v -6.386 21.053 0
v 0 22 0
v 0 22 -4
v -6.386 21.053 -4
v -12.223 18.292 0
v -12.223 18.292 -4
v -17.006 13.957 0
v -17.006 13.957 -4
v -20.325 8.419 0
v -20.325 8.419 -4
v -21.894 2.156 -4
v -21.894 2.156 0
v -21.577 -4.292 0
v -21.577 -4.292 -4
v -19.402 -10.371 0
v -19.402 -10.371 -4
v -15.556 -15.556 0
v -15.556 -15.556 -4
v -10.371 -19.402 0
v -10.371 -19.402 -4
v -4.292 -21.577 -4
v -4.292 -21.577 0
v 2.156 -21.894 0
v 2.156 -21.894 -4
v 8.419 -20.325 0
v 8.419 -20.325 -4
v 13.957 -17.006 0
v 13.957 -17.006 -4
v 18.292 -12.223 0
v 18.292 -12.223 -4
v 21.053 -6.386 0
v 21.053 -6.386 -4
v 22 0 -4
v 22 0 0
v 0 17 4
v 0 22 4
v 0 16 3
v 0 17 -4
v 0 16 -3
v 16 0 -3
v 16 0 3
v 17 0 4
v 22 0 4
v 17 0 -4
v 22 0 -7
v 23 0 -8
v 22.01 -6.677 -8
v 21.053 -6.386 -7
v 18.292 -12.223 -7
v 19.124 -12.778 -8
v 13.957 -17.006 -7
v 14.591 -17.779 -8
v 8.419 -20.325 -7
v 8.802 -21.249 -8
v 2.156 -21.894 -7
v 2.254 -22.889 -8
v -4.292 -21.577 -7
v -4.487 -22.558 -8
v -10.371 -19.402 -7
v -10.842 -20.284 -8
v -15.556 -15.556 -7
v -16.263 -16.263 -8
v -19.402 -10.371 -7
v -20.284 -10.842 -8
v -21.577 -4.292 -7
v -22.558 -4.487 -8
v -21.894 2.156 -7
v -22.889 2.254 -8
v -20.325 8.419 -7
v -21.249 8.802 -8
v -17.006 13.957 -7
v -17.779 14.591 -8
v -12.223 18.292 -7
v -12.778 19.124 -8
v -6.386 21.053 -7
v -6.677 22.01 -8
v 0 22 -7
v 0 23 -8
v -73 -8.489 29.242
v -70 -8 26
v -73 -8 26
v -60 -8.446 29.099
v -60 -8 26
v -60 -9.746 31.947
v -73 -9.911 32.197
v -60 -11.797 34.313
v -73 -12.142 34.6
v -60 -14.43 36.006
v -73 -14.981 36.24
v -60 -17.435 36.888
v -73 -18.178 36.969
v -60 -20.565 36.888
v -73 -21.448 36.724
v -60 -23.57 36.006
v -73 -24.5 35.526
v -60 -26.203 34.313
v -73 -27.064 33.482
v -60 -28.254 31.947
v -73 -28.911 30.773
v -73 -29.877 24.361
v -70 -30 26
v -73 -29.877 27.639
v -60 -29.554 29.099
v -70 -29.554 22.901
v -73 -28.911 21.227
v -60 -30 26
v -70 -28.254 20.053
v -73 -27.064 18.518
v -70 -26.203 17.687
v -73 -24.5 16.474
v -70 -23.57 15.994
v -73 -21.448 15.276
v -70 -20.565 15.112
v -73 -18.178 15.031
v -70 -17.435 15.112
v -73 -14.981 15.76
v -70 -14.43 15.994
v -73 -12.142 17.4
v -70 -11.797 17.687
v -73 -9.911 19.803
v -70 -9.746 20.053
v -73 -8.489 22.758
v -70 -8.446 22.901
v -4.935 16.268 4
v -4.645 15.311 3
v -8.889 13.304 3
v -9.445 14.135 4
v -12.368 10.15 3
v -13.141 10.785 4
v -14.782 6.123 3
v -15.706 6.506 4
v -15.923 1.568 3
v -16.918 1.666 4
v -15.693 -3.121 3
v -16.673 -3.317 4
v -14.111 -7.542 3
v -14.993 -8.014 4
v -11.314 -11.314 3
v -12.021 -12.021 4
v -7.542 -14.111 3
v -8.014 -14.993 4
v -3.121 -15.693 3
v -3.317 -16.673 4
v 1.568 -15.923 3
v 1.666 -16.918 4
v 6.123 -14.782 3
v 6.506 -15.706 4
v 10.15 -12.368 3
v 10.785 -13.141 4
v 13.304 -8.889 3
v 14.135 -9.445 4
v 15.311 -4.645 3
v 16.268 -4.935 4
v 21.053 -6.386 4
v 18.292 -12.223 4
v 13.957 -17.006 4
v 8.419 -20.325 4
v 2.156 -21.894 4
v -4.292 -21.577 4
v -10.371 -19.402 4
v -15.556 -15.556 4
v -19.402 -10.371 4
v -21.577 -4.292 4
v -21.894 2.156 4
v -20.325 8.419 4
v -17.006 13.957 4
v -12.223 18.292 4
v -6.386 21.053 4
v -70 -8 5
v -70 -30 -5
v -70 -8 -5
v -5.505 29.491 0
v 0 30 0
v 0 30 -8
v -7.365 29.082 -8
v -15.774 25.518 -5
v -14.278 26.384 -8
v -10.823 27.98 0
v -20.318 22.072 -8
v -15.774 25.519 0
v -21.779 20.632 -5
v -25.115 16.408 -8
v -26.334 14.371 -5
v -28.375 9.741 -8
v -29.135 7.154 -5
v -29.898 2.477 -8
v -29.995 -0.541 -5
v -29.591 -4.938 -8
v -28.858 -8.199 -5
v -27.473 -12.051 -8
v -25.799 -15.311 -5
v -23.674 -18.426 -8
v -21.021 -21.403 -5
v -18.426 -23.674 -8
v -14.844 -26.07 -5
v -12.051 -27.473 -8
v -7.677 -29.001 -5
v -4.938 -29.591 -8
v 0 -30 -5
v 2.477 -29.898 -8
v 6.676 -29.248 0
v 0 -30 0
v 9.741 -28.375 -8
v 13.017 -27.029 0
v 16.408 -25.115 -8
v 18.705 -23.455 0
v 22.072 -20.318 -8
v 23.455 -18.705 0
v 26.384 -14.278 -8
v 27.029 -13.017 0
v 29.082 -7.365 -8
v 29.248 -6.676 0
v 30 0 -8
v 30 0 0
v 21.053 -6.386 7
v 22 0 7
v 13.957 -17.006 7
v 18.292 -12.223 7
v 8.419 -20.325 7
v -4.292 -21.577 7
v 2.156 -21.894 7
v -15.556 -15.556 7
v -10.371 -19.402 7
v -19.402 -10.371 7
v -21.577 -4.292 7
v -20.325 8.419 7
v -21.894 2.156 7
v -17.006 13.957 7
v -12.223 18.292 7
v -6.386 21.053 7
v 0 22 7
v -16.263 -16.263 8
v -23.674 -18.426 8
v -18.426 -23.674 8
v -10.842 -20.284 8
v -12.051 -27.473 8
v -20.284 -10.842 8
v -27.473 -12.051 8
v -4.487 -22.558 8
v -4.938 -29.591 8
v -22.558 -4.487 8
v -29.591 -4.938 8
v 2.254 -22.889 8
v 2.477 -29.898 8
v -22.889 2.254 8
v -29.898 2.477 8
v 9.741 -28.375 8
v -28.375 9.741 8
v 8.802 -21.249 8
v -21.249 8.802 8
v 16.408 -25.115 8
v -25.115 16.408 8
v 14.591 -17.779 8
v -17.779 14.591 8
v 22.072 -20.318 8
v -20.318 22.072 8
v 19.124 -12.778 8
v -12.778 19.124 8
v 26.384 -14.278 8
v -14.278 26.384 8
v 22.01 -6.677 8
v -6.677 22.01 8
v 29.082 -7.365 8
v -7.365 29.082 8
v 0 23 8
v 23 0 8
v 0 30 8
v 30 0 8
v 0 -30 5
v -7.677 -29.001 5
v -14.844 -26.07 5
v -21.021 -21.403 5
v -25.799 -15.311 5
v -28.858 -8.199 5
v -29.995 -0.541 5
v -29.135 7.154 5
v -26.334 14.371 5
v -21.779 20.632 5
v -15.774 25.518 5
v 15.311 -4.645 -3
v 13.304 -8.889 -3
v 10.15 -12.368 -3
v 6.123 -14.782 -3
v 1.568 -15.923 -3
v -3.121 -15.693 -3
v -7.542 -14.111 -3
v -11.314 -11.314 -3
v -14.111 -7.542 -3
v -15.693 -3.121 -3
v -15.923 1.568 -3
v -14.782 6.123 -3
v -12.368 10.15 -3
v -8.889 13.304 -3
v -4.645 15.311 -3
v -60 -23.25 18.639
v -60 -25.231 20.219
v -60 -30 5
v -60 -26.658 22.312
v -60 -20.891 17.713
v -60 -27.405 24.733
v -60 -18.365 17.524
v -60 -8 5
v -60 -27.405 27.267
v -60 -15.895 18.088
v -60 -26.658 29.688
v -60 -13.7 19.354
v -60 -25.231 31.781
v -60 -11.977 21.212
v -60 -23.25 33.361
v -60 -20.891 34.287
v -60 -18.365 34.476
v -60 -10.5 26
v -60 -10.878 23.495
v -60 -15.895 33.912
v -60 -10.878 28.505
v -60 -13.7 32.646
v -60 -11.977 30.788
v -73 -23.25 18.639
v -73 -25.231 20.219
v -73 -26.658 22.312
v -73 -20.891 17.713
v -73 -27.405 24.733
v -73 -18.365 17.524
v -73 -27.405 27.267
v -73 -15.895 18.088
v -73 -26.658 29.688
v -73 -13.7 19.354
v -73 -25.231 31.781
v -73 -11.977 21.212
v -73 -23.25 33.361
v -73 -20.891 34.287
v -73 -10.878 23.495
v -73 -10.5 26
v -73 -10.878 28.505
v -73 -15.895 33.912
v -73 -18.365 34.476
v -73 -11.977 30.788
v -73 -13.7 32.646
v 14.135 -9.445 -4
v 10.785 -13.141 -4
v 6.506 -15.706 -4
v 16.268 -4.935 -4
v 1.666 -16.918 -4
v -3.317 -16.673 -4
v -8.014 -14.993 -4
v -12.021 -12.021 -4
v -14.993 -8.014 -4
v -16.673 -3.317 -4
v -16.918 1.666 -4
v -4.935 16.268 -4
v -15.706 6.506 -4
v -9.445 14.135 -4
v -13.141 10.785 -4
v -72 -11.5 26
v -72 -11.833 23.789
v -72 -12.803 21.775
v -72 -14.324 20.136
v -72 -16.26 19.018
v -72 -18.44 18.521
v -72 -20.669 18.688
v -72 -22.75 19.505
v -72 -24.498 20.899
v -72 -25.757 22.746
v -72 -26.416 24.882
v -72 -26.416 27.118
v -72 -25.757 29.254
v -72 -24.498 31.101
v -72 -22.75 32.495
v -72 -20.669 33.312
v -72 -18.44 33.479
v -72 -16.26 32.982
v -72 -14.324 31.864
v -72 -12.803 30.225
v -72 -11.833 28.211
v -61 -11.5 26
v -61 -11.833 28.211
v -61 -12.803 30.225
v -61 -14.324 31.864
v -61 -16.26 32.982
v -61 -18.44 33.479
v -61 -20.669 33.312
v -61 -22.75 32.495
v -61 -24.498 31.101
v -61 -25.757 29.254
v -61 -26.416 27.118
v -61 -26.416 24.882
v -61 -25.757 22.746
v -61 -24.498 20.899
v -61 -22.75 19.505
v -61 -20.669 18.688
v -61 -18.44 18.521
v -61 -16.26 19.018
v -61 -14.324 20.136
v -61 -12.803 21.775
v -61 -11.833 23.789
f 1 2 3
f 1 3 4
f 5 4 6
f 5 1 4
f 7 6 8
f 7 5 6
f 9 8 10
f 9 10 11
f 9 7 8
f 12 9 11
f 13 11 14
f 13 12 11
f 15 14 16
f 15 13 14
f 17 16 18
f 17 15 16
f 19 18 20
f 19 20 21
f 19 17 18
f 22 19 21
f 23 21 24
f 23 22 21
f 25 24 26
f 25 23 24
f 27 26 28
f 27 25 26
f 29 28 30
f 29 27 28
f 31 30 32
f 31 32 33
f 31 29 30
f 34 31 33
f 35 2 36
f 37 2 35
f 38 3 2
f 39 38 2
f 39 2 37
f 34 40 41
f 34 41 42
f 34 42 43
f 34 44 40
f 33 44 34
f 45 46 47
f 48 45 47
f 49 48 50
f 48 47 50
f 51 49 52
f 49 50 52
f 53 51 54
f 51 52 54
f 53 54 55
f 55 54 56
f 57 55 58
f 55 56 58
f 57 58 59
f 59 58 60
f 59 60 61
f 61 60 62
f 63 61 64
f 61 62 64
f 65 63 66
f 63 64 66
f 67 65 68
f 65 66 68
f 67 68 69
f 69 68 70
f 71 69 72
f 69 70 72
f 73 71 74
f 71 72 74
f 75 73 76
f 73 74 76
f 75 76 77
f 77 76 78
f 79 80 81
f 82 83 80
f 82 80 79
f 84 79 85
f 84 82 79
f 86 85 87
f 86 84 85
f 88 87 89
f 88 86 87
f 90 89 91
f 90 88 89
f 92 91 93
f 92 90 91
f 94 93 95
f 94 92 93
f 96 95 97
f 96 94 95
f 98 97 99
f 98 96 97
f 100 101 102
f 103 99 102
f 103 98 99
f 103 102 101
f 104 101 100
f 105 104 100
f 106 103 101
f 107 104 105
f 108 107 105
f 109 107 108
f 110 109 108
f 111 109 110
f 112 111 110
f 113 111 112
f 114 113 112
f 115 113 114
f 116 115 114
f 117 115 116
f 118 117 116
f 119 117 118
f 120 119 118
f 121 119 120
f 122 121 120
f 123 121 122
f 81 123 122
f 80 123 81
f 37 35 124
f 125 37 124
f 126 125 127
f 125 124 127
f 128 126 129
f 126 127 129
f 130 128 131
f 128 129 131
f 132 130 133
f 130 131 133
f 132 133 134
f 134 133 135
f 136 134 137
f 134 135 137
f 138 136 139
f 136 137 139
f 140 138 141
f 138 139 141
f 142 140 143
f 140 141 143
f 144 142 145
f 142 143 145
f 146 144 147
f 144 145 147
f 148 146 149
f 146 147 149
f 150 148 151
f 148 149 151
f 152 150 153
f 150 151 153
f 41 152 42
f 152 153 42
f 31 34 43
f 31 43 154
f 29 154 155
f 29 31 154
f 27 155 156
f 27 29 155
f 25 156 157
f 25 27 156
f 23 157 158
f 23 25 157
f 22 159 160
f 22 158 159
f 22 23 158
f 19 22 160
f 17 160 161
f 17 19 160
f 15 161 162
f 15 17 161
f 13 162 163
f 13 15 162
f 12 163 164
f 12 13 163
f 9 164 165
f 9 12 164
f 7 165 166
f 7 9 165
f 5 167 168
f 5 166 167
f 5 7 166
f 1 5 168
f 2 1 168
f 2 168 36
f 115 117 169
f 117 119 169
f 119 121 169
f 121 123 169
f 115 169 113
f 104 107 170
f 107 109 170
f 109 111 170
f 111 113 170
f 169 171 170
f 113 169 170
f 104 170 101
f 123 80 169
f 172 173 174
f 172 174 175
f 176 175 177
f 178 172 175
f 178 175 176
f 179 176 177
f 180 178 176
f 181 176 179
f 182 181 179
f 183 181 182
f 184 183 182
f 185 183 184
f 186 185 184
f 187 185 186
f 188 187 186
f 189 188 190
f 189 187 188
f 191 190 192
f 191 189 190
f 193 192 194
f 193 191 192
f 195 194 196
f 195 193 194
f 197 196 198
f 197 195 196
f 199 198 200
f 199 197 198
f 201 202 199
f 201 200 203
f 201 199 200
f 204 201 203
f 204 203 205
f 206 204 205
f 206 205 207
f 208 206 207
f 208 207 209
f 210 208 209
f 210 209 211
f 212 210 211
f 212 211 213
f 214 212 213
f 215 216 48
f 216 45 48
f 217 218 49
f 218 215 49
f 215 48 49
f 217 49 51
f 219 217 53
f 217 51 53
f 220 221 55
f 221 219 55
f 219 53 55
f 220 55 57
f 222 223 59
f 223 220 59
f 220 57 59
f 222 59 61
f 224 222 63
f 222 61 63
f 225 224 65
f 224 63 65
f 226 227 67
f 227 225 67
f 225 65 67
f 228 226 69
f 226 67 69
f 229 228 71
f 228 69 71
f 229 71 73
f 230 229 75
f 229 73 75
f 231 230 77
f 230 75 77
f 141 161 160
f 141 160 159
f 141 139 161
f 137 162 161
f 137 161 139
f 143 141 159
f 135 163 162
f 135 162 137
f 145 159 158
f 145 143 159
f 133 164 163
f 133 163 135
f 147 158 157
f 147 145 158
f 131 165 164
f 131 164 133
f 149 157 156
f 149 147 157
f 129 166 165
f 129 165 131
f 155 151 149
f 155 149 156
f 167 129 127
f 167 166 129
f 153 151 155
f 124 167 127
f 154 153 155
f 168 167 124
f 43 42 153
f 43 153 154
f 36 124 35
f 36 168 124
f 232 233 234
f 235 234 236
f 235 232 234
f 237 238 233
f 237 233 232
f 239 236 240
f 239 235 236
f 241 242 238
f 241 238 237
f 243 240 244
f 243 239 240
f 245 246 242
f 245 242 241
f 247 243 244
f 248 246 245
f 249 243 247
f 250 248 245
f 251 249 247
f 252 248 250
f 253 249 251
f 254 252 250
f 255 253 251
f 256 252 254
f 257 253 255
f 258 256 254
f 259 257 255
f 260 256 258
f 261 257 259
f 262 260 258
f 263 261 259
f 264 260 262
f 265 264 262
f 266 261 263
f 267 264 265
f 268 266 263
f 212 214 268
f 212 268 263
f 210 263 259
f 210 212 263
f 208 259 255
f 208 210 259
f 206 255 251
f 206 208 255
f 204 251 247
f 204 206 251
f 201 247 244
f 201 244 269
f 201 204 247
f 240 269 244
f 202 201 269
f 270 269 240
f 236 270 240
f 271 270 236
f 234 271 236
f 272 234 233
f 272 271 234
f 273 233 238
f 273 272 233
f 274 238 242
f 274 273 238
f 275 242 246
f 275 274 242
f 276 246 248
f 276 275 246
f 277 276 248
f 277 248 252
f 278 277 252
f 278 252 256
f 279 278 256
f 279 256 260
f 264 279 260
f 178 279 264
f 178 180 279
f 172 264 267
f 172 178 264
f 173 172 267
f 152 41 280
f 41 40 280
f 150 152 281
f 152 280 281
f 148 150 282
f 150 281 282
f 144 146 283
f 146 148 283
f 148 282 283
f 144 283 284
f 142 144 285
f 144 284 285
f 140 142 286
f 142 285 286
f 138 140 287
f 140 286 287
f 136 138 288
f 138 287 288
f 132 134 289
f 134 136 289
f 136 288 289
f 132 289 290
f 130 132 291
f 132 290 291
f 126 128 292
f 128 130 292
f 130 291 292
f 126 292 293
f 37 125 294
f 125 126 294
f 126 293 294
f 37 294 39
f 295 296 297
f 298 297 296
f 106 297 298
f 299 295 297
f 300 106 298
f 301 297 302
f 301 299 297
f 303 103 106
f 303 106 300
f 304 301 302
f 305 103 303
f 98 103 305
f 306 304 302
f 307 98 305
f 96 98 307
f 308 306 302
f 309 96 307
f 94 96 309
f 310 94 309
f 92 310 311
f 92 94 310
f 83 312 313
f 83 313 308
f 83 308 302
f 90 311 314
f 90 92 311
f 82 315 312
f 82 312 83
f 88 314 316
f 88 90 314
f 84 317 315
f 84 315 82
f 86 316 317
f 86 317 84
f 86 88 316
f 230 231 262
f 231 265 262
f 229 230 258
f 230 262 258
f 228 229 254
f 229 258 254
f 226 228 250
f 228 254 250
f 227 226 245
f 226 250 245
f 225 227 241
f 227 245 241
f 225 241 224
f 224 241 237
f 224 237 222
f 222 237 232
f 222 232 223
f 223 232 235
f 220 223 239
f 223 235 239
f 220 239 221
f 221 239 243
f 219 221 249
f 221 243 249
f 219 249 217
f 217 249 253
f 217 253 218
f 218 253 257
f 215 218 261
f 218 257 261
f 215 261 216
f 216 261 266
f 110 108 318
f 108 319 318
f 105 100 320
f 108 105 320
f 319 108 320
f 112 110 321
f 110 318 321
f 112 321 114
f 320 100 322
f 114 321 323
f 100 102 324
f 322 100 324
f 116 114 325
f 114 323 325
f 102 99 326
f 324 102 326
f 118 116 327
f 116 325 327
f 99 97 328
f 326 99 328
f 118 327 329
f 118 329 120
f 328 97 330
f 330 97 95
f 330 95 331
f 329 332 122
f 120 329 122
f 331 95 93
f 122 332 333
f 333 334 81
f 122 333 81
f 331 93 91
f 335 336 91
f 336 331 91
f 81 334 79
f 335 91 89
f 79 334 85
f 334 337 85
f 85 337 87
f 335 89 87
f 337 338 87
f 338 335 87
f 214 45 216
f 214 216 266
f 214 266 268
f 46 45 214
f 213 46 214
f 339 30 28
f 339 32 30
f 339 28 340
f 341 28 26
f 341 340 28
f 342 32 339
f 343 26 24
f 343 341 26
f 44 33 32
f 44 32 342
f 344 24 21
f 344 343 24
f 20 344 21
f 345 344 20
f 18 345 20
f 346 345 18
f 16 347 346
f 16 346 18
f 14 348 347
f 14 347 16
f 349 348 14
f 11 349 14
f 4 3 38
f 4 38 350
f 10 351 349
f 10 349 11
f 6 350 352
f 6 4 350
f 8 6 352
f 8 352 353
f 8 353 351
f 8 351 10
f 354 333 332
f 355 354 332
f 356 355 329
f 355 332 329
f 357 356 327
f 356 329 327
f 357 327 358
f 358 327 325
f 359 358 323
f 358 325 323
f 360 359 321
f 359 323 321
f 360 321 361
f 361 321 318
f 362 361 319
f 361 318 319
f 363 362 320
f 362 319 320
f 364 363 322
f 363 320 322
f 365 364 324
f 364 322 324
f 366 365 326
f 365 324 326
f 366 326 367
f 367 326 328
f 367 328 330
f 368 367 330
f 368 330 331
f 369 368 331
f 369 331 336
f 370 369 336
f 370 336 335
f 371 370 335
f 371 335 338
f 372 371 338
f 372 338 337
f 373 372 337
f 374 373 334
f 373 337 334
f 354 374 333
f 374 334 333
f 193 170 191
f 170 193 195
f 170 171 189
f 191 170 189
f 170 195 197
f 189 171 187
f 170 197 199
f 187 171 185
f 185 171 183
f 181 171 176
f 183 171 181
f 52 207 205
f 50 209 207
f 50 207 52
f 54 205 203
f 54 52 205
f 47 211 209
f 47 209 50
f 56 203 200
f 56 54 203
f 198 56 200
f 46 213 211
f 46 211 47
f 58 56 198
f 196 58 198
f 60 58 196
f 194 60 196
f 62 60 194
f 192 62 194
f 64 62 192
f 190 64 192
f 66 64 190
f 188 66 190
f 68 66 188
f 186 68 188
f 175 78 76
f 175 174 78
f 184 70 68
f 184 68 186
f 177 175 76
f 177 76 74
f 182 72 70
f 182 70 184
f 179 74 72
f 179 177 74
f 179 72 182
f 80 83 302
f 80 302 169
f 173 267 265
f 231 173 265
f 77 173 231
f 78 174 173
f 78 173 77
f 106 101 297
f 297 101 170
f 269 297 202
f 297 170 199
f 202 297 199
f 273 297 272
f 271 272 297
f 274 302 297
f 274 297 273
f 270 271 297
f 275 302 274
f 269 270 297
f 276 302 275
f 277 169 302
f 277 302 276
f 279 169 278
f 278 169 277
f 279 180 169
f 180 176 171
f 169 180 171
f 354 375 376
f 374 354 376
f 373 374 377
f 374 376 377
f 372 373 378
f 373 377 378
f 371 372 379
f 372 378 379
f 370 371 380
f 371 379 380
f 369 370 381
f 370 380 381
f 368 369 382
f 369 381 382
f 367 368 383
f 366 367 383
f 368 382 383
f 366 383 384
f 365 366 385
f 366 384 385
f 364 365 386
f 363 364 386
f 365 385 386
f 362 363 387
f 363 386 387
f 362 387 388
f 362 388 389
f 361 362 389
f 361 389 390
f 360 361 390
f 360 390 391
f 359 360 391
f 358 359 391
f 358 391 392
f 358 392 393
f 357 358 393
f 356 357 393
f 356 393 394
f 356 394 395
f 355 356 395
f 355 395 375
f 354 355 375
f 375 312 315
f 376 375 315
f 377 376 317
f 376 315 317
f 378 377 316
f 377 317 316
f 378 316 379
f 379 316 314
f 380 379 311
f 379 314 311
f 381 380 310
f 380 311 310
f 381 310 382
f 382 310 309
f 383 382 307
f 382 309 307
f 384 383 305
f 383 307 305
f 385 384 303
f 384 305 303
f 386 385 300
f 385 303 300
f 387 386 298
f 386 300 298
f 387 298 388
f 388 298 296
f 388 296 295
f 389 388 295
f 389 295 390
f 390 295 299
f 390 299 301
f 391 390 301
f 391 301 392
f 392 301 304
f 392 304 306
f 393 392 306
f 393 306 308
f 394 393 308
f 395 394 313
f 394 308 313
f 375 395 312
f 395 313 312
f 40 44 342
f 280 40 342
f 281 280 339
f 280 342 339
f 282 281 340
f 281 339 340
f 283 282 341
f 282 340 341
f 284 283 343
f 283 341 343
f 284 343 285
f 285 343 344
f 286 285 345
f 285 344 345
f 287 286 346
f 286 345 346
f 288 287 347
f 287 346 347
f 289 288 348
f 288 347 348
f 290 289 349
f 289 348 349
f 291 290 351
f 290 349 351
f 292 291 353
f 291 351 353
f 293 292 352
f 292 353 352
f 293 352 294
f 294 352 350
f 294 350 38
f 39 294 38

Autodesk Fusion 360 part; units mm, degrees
sketch "스케치1" plane through (0, 0, 0) normal (0, 0, 1) x (1, 0, 0)
  circle A0 centre (0, 0) radius 16
  circle A1 centre (0, 0) radius 22
  circle A2 centre (0, 0) radius 30
  line L0 (0, 0) -> (0, -30) construction
  line L1 (-15.7735, 25.5185) -> (-70, -8)
  line L2 (-70, -8) -> (-70, -30)
  line L3 (-70, -30) -> (0, -30)
  dimension "d1" = 32
  dimension "d2" = 44
  dimension "d3" = 60
  dimension "d18" = 70
  dimension "d19" = 22
extrude "돌출1" add sketch "스케치1" along normal blind 8 contours A2 makes body 1
extrude "돌출2" add sketch "스케치1" along normal blind 4 separate body contours A1 makes body 2
chamfer "챔퍼1" distance 1 angle 45 1 edges at (-20.5112, 7.9555, 8) on bodies 1
chamfer "챔퍼2" distance 1 angle 45 1 edges at (-14.9172, 5.7858, 4) measured on face at (19.8585, -1.8879, 4) on bodies 2
sketch "스케치2" plane through (0, 0, 0) normal (0, 0, 1) x (1, 0, 0)
  line L0 (0, 0) -> (30, 0)
  line L1 (30, 0) -> (30, 30)
  line L2 (30, 30) -> (0, 30)
  line L3 (0, 30) -> (0, 0)
  dimension "d11" = 30
  dimension "d12" = 30
mirror "미러2" about plane through (0, 0, 0) normal (0, 0, 1) of bodies 1 2 merged
extrude "돌출11" cut sketch "스케치2" along normal mid plane 16 bodies 1 2
extrude "돌출12" add sketch "스케치1" along normal mid plane 10 contours A2 L1 L2 L3 bodies 1
ref_plane "작업 평면3" through (0, 0, -4) normal (0, 0, -1) x (1, 0, 0)
sketch "스케치19" plane through (0, 0, -4) normal (0, 0, -1) x (-1, 0, 0)
  line L0 (70, -30) -> (60, -30)
  line L1 (60, -30) -> (60, -8)
  line L2 (60, -8) -> (70, -8)
  line L3 (70, -8) -> (70, -30)
  dimension "d75" = 10
  dimension "d76" = 22
  dimension "d77" = 70
  dimension "d78" = 30
extrude "돌출15" add sketch "스케치19" against normal blind 30 bodies 1
ref_plane "작업 평면4" through (-60, -19, 15.5) normal (1, 0, 0) x (0, 1, 0)
sketch "스케치20" plane through (-60, 0, 0) normal (1, 0, 0) x (0, 1, 0)
  circle A0 centre (-19, 26) radius 11
  circle A1 centre (-19, 26) radius 7.5
  line L0 (-30, 26) -> (-8, 26)
  dimension "d83" = 22
  dimension "d84" = 15
extrude "돌출16" add sketch "스케치20" against normal blind 13 contours A0 A1 L0 picked at (-26.783, 31.9678) bodies 1
extrude "돌출17" add sketch "스케치20" against normal blind 13 contours A0 A1 L0 picked at (-9.2355, 25.0809) bodies 1
extrude "돌출18" cut sketch "스케치20" against normal blind 10 contours A1 L0 picked at (-18.4437, 23.5627) bodies 1
chamfer "챔퍼3" distance 1 angle 45 1 edges at (-60, -25.9925, 28.7121) on bodies 1
chamfer "챔퍼4" distance 1 angle 45 1 edges at (-73, -25.9925, 23.2879) on bodies 1
